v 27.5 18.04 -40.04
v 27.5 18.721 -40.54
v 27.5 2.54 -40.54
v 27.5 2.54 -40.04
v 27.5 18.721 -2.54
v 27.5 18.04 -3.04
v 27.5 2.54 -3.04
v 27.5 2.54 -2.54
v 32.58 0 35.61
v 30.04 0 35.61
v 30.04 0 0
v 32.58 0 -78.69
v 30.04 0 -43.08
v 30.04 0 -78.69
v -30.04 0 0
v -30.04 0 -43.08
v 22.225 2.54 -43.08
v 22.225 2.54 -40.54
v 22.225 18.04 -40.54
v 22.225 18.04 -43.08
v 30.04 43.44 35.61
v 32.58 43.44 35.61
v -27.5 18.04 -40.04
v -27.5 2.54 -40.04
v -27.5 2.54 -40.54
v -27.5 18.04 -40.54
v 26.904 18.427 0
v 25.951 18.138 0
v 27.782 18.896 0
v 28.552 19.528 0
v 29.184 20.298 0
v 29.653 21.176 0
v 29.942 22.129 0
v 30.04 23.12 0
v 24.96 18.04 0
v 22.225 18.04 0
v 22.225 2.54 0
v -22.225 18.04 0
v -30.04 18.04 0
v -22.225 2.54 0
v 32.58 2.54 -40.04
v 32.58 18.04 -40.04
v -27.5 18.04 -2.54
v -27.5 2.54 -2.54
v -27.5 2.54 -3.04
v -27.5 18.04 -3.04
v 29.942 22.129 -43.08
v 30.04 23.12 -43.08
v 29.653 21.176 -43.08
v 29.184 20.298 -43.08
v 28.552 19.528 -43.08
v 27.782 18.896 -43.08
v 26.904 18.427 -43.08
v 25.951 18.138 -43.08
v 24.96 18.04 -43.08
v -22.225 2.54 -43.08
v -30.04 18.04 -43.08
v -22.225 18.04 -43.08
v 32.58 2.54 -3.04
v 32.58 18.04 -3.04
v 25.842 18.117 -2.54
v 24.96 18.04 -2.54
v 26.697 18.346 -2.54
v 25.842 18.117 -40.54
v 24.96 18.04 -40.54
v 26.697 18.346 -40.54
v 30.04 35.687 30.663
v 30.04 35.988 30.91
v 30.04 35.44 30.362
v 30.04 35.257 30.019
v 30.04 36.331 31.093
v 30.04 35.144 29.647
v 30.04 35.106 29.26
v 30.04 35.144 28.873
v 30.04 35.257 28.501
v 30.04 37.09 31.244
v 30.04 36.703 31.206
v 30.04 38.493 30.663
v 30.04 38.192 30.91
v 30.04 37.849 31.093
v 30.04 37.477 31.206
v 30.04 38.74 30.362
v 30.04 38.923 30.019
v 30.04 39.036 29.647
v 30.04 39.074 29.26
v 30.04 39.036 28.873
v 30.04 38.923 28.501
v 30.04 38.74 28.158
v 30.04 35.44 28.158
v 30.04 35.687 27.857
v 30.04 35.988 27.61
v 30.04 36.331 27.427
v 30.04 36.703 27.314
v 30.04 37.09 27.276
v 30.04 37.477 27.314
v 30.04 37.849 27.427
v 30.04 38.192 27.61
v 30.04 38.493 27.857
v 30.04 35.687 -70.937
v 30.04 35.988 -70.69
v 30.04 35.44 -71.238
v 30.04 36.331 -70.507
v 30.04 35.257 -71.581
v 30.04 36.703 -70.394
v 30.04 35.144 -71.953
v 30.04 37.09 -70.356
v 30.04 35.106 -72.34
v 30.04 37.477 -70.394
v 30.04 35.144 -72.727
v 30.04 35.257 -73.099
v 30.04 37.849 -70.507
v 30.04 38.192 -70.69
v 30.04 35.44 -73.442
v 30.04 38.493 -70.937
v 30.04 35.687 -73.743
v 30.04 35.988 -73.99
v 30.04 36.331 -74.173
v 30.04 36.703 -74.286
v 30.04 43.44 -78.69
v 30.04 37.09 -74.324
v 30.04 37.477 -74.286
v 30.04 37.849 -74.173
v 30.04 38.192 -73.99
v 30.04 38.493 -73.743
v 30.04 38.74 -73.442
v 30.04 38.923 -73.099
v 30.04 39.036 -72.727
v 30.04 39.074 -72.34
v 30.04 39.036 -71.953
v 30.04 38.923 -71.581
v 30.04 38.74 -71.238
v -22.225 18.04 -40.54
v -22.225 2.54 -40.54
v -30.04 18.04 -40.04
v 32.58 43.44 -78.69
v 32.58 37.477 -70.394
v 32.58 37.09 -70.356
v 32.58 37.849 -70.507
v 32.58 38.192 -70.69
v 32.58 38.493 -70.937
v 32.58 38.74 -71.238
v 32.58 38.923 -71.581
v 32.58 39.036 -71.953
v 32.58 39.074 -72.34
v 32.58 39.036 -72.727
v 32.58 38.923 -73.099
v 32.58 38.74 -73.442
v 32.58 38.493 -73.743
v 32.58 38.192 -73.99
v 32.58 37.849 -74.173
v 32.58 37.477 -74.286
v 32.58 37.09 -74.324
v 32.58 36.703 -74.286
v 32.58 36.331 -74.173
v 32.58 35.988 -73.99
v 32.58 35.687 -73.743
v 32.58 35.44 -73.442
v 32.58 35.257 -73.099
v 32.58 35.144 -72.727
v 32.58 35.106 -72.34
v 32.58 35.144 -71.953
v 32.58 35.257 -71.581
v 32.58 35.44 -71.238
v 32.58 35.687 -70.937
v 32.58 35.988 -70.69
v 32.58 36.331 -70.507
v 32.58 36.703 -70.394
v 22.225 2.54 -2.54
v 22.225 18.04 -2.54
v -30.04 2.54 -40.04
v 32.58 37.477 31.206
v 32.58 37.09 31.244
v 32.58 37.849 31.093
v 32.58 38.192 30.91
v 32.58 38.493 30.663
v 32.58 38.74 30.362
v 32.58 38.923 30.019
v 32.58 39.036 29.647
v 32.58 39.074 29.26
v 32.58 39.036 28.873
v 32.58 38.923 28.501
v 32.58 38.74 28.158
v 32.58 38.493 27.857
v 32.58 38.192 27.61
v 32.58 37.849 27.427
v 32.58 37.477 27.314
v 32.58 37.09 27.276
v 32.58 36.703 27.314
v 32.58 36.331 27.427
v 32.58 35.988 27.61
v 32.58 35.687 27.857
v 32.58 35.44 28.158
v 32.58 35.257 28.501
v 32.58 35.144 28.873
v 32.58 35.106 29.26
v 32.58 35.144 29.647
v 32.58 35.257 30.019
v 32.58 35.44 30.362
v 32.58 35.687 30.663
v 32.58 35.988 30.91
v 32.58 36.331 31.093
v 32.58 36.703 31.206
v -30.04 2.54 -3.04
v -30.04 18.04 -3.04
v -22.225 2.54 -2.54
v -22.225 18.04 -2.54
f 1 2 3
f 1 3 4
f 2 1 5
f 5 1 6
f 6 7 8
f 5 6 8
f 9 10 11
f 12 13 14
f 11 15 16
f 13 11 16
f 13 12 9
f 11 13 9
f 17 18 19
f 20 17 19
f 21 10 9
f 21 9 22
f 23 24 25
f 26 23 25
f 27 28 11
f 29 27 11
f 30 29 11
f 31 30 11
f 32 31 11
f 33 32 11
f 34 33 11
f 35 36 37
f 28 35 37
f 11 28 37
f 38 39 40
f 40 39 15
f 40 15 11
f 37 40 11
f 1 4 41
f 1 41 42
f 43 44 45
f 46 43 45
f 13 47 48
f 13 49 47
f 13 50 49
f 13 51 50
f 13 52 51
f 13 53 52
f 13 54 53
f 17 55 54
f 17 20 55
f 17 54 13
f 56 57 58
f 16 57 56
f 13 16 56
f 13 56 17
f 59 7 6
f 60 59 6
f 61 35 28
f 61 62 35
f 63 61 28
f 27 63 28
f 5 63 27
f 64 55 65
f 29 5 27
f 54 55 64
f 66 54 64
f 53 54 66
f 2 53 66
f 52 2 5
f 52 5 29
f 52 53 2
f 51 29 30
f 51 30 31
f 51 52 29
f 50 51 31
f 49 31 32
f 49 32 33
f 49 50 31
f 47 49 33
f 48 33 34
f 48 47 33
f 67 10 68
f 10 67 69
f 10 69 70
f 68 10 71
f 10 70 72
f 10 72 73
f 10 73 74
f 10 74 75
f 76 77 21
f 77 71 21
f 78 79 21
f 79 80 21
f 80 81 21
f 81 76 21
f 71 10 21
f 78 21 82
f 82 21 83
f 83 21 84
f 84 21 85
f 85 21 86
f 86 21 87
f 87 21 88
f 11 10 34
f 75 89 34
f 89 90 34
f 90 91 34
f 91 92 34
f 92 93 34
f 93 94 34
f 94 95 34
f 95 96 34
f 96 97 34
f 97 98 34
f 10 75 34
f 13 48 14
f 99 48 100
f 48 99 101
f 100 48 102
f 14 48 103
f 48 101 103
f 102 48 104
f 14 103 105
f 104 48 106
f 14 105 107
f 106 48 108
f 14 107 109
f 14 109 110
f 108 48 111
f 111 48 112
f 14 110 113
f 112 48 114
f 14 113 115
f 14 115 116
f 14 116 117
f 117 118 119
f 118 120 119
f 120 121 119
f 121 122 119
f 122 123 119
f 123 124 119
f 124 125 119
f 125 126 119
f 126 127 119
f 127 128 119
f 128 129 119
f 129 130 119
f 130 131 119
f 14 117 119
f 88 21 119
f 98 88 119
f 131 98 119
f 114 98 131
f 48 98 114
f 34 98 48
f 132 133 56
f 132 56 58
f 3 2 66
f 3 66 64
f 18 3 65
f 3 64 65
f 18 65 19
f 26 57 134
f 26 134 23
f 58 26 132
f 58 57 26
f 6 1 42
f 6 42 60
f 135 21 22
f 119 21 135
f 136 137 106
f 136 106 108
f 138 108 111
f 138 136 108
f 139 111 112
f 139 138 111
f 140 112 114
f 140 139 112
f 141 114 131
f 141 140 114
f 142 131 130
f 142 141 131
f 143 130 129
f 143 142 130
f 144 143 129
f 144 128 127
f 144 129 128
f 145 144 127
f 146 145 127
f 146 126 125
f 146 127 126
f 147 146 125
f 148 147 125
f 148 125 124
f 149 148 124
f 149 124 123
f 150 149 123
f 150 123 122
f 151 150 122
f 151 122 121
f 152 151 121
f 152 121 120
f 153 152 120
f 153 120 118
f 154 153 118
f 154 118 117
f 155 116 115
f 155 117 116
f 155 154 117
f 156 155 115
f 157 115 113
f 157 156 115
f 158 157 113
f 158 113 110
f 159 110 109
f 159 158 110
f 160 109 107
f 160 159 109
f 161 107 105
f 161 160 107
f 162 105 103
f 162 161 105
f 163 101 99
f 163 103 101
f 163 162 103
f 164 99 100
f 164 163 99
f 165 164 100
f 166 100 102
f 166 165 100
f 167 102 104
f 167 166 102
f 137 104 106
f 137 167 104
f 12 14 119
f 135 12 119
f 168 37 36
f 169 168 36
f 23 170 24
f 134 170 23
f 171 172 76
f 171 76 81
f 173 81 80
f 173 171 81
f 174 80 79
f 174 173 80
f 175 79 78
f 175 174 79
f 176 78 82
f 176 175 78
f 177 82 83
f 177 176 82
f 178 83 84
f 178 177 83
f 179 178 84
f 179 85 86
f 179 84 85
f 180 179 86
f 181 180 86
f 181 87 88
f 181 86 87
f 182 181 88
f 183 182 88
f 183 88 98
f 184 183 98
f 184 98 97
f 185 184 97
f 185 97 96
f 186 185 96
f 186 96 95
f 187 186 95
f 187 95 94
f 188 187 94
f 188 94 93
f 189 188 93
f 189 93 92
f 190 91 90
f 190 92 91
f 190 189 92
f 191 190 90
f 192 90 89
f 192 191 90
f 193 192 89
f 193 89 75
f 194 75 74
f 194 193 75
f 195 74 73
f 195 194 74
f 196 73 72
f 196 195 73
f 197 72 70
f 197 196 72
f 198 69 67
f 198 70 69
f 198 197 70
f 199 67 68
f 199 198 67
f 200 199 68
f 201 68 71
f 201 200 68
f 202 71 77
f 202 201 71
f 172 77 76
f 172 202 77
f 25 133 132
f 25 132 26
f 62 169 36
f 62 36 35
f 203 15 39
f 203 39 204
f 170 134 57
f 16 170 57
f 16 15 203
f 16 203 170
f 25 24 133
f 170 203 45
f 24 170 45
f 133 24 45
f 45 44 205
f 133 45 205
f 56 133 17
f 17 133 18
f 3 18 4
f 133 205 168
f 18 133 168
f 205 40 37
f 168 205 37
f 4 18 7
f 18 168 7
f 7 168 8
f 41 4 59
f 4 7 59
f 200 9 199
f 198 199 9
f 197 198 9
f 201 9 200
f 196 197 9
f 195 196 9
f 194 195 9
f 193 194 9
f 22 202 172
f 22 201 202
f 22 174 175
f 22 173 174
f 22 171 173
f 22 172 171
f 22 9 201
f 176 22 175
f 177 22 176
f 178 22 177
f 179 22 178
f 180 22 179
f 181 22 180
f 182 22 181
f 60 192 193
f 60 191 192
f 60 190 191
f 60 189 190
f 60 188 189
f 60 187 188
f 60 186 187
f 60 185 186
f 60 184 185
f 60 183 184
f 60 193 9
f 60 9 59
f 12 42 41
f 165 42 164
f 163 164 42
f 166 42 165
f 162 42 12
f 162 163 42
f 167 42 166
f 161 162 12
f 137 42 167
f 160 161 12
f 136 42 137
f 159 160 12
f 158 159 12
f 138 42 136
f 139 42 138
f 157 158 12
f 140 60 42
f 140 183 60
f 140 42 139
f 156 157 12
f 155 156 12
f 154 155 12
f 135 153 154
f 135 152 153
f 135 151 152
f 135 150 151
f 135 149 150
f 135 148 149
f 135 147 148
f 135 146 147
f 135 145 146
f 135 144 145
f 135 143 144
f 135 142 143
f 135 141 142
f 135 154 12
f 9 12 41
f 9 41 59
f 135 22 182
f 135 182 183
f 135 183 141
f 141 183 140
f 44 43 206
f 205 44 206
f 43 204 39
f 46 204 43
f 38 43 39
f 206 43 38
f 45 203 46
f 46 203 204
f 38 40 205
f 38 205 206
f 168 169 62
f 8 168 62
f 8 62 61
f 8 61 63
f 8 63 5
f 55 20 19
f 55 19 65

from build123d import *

# Parameters (mm, degrees)
SKETCH1_W               = 60.079999982
SKETCH1_H               = 43.079999946
BOSS_EXTRUDE1_DEPTH     = 18.039999988
SHELL1_T                = -2.54
SKETCH2_W               = 114.3
SKETCH2_H               = 43.439999988
BOSS_EXTRUDE2_DEPTH     = 2.54
FILLET1_R               = 5.08
CUT_EXTRUDE1_DEPTH      = 109.11455079
CUT_EXTRUDE1_DEPTH_BACK = 109.11455079
SKETCH3_R               = 1.984375
SKETCH5_W               = 44.45
SKETCH5_H               = 15.499999988
CUT_EXTRUDE2_DEPTH      = 96.606517007
SKETCH6_W               = 37
SKETCH6_H               = 15.499999988
CUT_EXTRUDE3_DEPTH      = 110.54640155


with BuildPart() as part:
    # Sketch1 → Boss-Extrude1 (new body)
    with BuildSketch(Plane(origin=(0, 0, 0), x_dir=(1, 0, 0), z_dir=(0, 1, 0))):
        with Locations((0, 21.539999973)):
            Rectangle(SKETCH1_W, SKETCH1_H)
    extrude(amount=BOSS_EXTRUDE1_DEPTH)

    # Shell1
    shell1_openings = [part.faces().sort_by_distance(p)[0] for p in [
        (0, 18.039999988, -21.539999973),
    ]]
    offset(amount=SHELL1_T, openings=shell1_openings, kind=Kind.INTERSECTION)

    # Sketch2 → Boss-Extrude2 (add)
    with BuildSketch(Plane(origin=(30.039999991, 0, 0), x_dir=(0, 0, -1), z_dir=(1, 0, 0))):
        with Locations((21.539999973, 21.719999994)):
            Rectangle(SKETCH2_W, SKETCH2_H)
    extrude(amount=BOSS_EXTRUDE2_DEPTH)

    # Fillet1
    # the kernel refuses this fillet: 5.08 mm, written as the material it adds along each edge
    with BuildSketch(Plane(origin=(30.039999991, 18.039999988, -43.079999946), x_dir=(0, 1, 0), z_dir=(0, 0, 1))) as fillet1_piece_1_section:
        with BuildLine():
            CenterArc((FILLET1_R, FILLET1_R), FILLET1_R, 180, 90)
            Line((0, FILLET1_R), (0, 0))
            Line((0, 0), (FILLET1_R, 0))
        make_face()
    fillet1_piece_1 = extrude(amount=43.079999946, mode=Mode.PRIVATE)
    fillet1_piece_1 = split(fillet1_piece_1, bisect_by=Plane(origin=(29.204889828, 19.336009893, -40.539999946), z_dir=(0, 0, -1)), keep=Keep.TOP, mode=Mode.PRIVATE)
    fillet1_piece_1 = split(fillet1_piece_1, bisect_by=Plane(origin=(27.499999991, 19.336009893, -41.809999946), z_dir=(1, 0, 0)), keep=Keep.TOP, mode=Mode.PRIVATE)
    add(fillet1_piece_1)
    with BuildSketch(Plane(origin=(30.039999991, 18.039999988, -43.079999946), x_dir=(0, 1, 0), z_dir=(0, 0, 1))) as fillet1_piece_2_section:
        with BuildLine():
            CenterArc((FILLET1_R, FILLET1_R), FILLET1_R, 180, 90)
            Line((0, FILLET1_R), (0, 0))
            Line((0, 0), (FILLET1_R, 0))
        make_face()
    fillet1_piece_2 = extrude(amount=43.079999946, mode=Mode.PRIVATE)
    fillet1_piece_2 = split(fillet1_piece_2, bisect_by=Plane(origin=(26.670686006, 18.161962567, -40.539999946), z_dir=(0, 0, -1)), keep=Keep.TOP, mode=Mode.PRIVATE)
    fillet1_piece_2 = split(fillet1_piece_2, bisect_by=Plane(origin=(27.499999991, 18.161962567, -41.809999946), z_dir=(-1, 0, 0)), keep=Keep.TOP, mode=Mode.PRIVATE)
    add(fillet1_piece_2)
    with BuildSketch(Plane(origin=(30.039999991, 18.039999988, -43.079999946), x_dir=(0, 1, 0), z_dir=(0, 0, 1))) as fillet1_piece_3_section:
        with BuildLine():
            CenterArc((FILLET1_R, FILLET1_R), FILLET1_R, 180, 90)
            Line((0, FILLET1_R), (0, 0))
            Line((0, 0), (FILLET1_R, 0))
        make_face()
    fillet1_piece_3 = extrude(amount=43.079999946, mode=Mode.PRIVATE)
    fillet1_piece_3 = split(fillet1_piece_3, bisect_by=Plane(origin=(29.204889828, 19.336009893, -40.539999946), z_dir=(0, 0, 1)), keep=Keep.TOP, mode=Mode.PRIVATE)
    fillet1_piece_3 = split(fillet1_piece_3, bisect_by=Plane(origin=(29.204889828, 19.336009893, -2.54), z_dir=(0, 0, -1)), keep=Keep.TOP, mode=Mode.PRIVATE)
    fillet1_piece_3 = split(fillet1_piece_3, bisect_by=Plane(origin=(27.499999991, 19.336009893, -21.539999973), z_dir=(1, 0, 0)), keep=Keep.TOP, mode=Mode.PRIVATE)
    add(fillet1_piece_3)
    with BuildSketch(Plane(origin=(30.039999991, 18.039999988, -43.079999946), x_dir=(0, 1, 0), z_dir=(0, 0, 1))) as fillet1_piece_4_section:
        with BuildLine():
            CenterArc((FILLET1_R, FILLET1_R), FILLET1_R, 180, 90)
            Line((0, FILLET1_R), (0, 0))
            Line((0, 0), (FILLET1_R, 0))
        make_face()
    fillet1_piece_4 = extrude(amount=43.079999946, mode=Mode.PRIVATE)
    fillet1_piece_4 = split(fillet1_piece_4, bisect_by=Plane(origin=(29.204889828, 19.336009893, -2.54), z_dir=(0, 0, 1)), keep=Keep.TOP, mode=Mode.PRIVATE)
    fillet1_piece_4 = split(fillet1_piece_4, bisect_by=Plane(origin=(27.499999991, 19.336009893, -1.27), z_dir=(1, 0, 0)), keep=Keep.TOP, mode=Mode.PRIVATE)
    add(fillet1_piece_4)
    with BuildSketch(Plane(origin=(30.039999991, 18.039999988, -43.079999946), x_dir=(0, 1, 0), z_dir=(0, 0, 1))) as fillet1_piece_5_section:
        with BuildLine():
            CenterArc((FILLET1_R, FILLET1_R), FILLET1_R, 180, 90)
            Line((0, FILLET1_R), (0, 0))
            Line((0, 0), (FILLET1_R, 0))
        make_face()
    fillet1_piece_5 = extrude(amount=43.079999946, mode=Mode.PRIVATE)
    fillet1_piece_5 = split(fillet1_piece_5, bisect_by=Plane(origin=(26.670686006, 18.161962567, -2.54), z_dir=(0, 0, 1)), keep=Keep.TOP, mode=Mode.PRIVATE)
    fillet1_piece_5 = split(fillet1_piece_5, bisect_by=Plane(origin=(27.499999991, 18.161962567, -1.27), z_dir=(-1, 0, 0)), keep=Keep.TOP, mode=Mode.PRIVATE)
    add(fillet1_piece_5)

    # Sketch3 → Cut-Extrude1 (cut, two sides: drawn at the far end of the back side and taken through both)
    with BuildSketch(Plane.ZY.offset(-30.039999991).offset(-CUT_EXTRUDE1_DEPTH_BACK)):
        with Locations((-72.339999973, 37.089999988)):
            Circle(SKETCH3_R)
        with Locations((29.260000027, 37.089999988)):
            Circle(SKETCH3_R)
    extrude(amount=CUT_EXTRUDE1_DEPTH + CUT_EXTRUDE1_DEPTH_BACK, mode=Mode.SUBTRACT)

    # Sketch5 → Cut-Extrude2 (cut, through all)
    with BuildSketch(Plane.XY):
        with Locations((0, 10.289999994)):
            Rectangle(SKETCH5_W, SKETCH5_H)
    extrude(amount=-CUT_EXTRUDE2_DEPTH, mode=Mode.SUBTRACT)

    # Sketch6 → Cut-Extrude3 (cut, through all)
    with BuildSketch(Plane.ZY.offset(30.039999991)):
        with Locations((-21.539999973, 10.289999994)):
            Rectangle(SKETCH6_W, SKETCH6_H)
    extrude(amount=-CUT_EXTRUDE3_DEPTH, mode=Mode.SUBTRACT)


solid = part.part
